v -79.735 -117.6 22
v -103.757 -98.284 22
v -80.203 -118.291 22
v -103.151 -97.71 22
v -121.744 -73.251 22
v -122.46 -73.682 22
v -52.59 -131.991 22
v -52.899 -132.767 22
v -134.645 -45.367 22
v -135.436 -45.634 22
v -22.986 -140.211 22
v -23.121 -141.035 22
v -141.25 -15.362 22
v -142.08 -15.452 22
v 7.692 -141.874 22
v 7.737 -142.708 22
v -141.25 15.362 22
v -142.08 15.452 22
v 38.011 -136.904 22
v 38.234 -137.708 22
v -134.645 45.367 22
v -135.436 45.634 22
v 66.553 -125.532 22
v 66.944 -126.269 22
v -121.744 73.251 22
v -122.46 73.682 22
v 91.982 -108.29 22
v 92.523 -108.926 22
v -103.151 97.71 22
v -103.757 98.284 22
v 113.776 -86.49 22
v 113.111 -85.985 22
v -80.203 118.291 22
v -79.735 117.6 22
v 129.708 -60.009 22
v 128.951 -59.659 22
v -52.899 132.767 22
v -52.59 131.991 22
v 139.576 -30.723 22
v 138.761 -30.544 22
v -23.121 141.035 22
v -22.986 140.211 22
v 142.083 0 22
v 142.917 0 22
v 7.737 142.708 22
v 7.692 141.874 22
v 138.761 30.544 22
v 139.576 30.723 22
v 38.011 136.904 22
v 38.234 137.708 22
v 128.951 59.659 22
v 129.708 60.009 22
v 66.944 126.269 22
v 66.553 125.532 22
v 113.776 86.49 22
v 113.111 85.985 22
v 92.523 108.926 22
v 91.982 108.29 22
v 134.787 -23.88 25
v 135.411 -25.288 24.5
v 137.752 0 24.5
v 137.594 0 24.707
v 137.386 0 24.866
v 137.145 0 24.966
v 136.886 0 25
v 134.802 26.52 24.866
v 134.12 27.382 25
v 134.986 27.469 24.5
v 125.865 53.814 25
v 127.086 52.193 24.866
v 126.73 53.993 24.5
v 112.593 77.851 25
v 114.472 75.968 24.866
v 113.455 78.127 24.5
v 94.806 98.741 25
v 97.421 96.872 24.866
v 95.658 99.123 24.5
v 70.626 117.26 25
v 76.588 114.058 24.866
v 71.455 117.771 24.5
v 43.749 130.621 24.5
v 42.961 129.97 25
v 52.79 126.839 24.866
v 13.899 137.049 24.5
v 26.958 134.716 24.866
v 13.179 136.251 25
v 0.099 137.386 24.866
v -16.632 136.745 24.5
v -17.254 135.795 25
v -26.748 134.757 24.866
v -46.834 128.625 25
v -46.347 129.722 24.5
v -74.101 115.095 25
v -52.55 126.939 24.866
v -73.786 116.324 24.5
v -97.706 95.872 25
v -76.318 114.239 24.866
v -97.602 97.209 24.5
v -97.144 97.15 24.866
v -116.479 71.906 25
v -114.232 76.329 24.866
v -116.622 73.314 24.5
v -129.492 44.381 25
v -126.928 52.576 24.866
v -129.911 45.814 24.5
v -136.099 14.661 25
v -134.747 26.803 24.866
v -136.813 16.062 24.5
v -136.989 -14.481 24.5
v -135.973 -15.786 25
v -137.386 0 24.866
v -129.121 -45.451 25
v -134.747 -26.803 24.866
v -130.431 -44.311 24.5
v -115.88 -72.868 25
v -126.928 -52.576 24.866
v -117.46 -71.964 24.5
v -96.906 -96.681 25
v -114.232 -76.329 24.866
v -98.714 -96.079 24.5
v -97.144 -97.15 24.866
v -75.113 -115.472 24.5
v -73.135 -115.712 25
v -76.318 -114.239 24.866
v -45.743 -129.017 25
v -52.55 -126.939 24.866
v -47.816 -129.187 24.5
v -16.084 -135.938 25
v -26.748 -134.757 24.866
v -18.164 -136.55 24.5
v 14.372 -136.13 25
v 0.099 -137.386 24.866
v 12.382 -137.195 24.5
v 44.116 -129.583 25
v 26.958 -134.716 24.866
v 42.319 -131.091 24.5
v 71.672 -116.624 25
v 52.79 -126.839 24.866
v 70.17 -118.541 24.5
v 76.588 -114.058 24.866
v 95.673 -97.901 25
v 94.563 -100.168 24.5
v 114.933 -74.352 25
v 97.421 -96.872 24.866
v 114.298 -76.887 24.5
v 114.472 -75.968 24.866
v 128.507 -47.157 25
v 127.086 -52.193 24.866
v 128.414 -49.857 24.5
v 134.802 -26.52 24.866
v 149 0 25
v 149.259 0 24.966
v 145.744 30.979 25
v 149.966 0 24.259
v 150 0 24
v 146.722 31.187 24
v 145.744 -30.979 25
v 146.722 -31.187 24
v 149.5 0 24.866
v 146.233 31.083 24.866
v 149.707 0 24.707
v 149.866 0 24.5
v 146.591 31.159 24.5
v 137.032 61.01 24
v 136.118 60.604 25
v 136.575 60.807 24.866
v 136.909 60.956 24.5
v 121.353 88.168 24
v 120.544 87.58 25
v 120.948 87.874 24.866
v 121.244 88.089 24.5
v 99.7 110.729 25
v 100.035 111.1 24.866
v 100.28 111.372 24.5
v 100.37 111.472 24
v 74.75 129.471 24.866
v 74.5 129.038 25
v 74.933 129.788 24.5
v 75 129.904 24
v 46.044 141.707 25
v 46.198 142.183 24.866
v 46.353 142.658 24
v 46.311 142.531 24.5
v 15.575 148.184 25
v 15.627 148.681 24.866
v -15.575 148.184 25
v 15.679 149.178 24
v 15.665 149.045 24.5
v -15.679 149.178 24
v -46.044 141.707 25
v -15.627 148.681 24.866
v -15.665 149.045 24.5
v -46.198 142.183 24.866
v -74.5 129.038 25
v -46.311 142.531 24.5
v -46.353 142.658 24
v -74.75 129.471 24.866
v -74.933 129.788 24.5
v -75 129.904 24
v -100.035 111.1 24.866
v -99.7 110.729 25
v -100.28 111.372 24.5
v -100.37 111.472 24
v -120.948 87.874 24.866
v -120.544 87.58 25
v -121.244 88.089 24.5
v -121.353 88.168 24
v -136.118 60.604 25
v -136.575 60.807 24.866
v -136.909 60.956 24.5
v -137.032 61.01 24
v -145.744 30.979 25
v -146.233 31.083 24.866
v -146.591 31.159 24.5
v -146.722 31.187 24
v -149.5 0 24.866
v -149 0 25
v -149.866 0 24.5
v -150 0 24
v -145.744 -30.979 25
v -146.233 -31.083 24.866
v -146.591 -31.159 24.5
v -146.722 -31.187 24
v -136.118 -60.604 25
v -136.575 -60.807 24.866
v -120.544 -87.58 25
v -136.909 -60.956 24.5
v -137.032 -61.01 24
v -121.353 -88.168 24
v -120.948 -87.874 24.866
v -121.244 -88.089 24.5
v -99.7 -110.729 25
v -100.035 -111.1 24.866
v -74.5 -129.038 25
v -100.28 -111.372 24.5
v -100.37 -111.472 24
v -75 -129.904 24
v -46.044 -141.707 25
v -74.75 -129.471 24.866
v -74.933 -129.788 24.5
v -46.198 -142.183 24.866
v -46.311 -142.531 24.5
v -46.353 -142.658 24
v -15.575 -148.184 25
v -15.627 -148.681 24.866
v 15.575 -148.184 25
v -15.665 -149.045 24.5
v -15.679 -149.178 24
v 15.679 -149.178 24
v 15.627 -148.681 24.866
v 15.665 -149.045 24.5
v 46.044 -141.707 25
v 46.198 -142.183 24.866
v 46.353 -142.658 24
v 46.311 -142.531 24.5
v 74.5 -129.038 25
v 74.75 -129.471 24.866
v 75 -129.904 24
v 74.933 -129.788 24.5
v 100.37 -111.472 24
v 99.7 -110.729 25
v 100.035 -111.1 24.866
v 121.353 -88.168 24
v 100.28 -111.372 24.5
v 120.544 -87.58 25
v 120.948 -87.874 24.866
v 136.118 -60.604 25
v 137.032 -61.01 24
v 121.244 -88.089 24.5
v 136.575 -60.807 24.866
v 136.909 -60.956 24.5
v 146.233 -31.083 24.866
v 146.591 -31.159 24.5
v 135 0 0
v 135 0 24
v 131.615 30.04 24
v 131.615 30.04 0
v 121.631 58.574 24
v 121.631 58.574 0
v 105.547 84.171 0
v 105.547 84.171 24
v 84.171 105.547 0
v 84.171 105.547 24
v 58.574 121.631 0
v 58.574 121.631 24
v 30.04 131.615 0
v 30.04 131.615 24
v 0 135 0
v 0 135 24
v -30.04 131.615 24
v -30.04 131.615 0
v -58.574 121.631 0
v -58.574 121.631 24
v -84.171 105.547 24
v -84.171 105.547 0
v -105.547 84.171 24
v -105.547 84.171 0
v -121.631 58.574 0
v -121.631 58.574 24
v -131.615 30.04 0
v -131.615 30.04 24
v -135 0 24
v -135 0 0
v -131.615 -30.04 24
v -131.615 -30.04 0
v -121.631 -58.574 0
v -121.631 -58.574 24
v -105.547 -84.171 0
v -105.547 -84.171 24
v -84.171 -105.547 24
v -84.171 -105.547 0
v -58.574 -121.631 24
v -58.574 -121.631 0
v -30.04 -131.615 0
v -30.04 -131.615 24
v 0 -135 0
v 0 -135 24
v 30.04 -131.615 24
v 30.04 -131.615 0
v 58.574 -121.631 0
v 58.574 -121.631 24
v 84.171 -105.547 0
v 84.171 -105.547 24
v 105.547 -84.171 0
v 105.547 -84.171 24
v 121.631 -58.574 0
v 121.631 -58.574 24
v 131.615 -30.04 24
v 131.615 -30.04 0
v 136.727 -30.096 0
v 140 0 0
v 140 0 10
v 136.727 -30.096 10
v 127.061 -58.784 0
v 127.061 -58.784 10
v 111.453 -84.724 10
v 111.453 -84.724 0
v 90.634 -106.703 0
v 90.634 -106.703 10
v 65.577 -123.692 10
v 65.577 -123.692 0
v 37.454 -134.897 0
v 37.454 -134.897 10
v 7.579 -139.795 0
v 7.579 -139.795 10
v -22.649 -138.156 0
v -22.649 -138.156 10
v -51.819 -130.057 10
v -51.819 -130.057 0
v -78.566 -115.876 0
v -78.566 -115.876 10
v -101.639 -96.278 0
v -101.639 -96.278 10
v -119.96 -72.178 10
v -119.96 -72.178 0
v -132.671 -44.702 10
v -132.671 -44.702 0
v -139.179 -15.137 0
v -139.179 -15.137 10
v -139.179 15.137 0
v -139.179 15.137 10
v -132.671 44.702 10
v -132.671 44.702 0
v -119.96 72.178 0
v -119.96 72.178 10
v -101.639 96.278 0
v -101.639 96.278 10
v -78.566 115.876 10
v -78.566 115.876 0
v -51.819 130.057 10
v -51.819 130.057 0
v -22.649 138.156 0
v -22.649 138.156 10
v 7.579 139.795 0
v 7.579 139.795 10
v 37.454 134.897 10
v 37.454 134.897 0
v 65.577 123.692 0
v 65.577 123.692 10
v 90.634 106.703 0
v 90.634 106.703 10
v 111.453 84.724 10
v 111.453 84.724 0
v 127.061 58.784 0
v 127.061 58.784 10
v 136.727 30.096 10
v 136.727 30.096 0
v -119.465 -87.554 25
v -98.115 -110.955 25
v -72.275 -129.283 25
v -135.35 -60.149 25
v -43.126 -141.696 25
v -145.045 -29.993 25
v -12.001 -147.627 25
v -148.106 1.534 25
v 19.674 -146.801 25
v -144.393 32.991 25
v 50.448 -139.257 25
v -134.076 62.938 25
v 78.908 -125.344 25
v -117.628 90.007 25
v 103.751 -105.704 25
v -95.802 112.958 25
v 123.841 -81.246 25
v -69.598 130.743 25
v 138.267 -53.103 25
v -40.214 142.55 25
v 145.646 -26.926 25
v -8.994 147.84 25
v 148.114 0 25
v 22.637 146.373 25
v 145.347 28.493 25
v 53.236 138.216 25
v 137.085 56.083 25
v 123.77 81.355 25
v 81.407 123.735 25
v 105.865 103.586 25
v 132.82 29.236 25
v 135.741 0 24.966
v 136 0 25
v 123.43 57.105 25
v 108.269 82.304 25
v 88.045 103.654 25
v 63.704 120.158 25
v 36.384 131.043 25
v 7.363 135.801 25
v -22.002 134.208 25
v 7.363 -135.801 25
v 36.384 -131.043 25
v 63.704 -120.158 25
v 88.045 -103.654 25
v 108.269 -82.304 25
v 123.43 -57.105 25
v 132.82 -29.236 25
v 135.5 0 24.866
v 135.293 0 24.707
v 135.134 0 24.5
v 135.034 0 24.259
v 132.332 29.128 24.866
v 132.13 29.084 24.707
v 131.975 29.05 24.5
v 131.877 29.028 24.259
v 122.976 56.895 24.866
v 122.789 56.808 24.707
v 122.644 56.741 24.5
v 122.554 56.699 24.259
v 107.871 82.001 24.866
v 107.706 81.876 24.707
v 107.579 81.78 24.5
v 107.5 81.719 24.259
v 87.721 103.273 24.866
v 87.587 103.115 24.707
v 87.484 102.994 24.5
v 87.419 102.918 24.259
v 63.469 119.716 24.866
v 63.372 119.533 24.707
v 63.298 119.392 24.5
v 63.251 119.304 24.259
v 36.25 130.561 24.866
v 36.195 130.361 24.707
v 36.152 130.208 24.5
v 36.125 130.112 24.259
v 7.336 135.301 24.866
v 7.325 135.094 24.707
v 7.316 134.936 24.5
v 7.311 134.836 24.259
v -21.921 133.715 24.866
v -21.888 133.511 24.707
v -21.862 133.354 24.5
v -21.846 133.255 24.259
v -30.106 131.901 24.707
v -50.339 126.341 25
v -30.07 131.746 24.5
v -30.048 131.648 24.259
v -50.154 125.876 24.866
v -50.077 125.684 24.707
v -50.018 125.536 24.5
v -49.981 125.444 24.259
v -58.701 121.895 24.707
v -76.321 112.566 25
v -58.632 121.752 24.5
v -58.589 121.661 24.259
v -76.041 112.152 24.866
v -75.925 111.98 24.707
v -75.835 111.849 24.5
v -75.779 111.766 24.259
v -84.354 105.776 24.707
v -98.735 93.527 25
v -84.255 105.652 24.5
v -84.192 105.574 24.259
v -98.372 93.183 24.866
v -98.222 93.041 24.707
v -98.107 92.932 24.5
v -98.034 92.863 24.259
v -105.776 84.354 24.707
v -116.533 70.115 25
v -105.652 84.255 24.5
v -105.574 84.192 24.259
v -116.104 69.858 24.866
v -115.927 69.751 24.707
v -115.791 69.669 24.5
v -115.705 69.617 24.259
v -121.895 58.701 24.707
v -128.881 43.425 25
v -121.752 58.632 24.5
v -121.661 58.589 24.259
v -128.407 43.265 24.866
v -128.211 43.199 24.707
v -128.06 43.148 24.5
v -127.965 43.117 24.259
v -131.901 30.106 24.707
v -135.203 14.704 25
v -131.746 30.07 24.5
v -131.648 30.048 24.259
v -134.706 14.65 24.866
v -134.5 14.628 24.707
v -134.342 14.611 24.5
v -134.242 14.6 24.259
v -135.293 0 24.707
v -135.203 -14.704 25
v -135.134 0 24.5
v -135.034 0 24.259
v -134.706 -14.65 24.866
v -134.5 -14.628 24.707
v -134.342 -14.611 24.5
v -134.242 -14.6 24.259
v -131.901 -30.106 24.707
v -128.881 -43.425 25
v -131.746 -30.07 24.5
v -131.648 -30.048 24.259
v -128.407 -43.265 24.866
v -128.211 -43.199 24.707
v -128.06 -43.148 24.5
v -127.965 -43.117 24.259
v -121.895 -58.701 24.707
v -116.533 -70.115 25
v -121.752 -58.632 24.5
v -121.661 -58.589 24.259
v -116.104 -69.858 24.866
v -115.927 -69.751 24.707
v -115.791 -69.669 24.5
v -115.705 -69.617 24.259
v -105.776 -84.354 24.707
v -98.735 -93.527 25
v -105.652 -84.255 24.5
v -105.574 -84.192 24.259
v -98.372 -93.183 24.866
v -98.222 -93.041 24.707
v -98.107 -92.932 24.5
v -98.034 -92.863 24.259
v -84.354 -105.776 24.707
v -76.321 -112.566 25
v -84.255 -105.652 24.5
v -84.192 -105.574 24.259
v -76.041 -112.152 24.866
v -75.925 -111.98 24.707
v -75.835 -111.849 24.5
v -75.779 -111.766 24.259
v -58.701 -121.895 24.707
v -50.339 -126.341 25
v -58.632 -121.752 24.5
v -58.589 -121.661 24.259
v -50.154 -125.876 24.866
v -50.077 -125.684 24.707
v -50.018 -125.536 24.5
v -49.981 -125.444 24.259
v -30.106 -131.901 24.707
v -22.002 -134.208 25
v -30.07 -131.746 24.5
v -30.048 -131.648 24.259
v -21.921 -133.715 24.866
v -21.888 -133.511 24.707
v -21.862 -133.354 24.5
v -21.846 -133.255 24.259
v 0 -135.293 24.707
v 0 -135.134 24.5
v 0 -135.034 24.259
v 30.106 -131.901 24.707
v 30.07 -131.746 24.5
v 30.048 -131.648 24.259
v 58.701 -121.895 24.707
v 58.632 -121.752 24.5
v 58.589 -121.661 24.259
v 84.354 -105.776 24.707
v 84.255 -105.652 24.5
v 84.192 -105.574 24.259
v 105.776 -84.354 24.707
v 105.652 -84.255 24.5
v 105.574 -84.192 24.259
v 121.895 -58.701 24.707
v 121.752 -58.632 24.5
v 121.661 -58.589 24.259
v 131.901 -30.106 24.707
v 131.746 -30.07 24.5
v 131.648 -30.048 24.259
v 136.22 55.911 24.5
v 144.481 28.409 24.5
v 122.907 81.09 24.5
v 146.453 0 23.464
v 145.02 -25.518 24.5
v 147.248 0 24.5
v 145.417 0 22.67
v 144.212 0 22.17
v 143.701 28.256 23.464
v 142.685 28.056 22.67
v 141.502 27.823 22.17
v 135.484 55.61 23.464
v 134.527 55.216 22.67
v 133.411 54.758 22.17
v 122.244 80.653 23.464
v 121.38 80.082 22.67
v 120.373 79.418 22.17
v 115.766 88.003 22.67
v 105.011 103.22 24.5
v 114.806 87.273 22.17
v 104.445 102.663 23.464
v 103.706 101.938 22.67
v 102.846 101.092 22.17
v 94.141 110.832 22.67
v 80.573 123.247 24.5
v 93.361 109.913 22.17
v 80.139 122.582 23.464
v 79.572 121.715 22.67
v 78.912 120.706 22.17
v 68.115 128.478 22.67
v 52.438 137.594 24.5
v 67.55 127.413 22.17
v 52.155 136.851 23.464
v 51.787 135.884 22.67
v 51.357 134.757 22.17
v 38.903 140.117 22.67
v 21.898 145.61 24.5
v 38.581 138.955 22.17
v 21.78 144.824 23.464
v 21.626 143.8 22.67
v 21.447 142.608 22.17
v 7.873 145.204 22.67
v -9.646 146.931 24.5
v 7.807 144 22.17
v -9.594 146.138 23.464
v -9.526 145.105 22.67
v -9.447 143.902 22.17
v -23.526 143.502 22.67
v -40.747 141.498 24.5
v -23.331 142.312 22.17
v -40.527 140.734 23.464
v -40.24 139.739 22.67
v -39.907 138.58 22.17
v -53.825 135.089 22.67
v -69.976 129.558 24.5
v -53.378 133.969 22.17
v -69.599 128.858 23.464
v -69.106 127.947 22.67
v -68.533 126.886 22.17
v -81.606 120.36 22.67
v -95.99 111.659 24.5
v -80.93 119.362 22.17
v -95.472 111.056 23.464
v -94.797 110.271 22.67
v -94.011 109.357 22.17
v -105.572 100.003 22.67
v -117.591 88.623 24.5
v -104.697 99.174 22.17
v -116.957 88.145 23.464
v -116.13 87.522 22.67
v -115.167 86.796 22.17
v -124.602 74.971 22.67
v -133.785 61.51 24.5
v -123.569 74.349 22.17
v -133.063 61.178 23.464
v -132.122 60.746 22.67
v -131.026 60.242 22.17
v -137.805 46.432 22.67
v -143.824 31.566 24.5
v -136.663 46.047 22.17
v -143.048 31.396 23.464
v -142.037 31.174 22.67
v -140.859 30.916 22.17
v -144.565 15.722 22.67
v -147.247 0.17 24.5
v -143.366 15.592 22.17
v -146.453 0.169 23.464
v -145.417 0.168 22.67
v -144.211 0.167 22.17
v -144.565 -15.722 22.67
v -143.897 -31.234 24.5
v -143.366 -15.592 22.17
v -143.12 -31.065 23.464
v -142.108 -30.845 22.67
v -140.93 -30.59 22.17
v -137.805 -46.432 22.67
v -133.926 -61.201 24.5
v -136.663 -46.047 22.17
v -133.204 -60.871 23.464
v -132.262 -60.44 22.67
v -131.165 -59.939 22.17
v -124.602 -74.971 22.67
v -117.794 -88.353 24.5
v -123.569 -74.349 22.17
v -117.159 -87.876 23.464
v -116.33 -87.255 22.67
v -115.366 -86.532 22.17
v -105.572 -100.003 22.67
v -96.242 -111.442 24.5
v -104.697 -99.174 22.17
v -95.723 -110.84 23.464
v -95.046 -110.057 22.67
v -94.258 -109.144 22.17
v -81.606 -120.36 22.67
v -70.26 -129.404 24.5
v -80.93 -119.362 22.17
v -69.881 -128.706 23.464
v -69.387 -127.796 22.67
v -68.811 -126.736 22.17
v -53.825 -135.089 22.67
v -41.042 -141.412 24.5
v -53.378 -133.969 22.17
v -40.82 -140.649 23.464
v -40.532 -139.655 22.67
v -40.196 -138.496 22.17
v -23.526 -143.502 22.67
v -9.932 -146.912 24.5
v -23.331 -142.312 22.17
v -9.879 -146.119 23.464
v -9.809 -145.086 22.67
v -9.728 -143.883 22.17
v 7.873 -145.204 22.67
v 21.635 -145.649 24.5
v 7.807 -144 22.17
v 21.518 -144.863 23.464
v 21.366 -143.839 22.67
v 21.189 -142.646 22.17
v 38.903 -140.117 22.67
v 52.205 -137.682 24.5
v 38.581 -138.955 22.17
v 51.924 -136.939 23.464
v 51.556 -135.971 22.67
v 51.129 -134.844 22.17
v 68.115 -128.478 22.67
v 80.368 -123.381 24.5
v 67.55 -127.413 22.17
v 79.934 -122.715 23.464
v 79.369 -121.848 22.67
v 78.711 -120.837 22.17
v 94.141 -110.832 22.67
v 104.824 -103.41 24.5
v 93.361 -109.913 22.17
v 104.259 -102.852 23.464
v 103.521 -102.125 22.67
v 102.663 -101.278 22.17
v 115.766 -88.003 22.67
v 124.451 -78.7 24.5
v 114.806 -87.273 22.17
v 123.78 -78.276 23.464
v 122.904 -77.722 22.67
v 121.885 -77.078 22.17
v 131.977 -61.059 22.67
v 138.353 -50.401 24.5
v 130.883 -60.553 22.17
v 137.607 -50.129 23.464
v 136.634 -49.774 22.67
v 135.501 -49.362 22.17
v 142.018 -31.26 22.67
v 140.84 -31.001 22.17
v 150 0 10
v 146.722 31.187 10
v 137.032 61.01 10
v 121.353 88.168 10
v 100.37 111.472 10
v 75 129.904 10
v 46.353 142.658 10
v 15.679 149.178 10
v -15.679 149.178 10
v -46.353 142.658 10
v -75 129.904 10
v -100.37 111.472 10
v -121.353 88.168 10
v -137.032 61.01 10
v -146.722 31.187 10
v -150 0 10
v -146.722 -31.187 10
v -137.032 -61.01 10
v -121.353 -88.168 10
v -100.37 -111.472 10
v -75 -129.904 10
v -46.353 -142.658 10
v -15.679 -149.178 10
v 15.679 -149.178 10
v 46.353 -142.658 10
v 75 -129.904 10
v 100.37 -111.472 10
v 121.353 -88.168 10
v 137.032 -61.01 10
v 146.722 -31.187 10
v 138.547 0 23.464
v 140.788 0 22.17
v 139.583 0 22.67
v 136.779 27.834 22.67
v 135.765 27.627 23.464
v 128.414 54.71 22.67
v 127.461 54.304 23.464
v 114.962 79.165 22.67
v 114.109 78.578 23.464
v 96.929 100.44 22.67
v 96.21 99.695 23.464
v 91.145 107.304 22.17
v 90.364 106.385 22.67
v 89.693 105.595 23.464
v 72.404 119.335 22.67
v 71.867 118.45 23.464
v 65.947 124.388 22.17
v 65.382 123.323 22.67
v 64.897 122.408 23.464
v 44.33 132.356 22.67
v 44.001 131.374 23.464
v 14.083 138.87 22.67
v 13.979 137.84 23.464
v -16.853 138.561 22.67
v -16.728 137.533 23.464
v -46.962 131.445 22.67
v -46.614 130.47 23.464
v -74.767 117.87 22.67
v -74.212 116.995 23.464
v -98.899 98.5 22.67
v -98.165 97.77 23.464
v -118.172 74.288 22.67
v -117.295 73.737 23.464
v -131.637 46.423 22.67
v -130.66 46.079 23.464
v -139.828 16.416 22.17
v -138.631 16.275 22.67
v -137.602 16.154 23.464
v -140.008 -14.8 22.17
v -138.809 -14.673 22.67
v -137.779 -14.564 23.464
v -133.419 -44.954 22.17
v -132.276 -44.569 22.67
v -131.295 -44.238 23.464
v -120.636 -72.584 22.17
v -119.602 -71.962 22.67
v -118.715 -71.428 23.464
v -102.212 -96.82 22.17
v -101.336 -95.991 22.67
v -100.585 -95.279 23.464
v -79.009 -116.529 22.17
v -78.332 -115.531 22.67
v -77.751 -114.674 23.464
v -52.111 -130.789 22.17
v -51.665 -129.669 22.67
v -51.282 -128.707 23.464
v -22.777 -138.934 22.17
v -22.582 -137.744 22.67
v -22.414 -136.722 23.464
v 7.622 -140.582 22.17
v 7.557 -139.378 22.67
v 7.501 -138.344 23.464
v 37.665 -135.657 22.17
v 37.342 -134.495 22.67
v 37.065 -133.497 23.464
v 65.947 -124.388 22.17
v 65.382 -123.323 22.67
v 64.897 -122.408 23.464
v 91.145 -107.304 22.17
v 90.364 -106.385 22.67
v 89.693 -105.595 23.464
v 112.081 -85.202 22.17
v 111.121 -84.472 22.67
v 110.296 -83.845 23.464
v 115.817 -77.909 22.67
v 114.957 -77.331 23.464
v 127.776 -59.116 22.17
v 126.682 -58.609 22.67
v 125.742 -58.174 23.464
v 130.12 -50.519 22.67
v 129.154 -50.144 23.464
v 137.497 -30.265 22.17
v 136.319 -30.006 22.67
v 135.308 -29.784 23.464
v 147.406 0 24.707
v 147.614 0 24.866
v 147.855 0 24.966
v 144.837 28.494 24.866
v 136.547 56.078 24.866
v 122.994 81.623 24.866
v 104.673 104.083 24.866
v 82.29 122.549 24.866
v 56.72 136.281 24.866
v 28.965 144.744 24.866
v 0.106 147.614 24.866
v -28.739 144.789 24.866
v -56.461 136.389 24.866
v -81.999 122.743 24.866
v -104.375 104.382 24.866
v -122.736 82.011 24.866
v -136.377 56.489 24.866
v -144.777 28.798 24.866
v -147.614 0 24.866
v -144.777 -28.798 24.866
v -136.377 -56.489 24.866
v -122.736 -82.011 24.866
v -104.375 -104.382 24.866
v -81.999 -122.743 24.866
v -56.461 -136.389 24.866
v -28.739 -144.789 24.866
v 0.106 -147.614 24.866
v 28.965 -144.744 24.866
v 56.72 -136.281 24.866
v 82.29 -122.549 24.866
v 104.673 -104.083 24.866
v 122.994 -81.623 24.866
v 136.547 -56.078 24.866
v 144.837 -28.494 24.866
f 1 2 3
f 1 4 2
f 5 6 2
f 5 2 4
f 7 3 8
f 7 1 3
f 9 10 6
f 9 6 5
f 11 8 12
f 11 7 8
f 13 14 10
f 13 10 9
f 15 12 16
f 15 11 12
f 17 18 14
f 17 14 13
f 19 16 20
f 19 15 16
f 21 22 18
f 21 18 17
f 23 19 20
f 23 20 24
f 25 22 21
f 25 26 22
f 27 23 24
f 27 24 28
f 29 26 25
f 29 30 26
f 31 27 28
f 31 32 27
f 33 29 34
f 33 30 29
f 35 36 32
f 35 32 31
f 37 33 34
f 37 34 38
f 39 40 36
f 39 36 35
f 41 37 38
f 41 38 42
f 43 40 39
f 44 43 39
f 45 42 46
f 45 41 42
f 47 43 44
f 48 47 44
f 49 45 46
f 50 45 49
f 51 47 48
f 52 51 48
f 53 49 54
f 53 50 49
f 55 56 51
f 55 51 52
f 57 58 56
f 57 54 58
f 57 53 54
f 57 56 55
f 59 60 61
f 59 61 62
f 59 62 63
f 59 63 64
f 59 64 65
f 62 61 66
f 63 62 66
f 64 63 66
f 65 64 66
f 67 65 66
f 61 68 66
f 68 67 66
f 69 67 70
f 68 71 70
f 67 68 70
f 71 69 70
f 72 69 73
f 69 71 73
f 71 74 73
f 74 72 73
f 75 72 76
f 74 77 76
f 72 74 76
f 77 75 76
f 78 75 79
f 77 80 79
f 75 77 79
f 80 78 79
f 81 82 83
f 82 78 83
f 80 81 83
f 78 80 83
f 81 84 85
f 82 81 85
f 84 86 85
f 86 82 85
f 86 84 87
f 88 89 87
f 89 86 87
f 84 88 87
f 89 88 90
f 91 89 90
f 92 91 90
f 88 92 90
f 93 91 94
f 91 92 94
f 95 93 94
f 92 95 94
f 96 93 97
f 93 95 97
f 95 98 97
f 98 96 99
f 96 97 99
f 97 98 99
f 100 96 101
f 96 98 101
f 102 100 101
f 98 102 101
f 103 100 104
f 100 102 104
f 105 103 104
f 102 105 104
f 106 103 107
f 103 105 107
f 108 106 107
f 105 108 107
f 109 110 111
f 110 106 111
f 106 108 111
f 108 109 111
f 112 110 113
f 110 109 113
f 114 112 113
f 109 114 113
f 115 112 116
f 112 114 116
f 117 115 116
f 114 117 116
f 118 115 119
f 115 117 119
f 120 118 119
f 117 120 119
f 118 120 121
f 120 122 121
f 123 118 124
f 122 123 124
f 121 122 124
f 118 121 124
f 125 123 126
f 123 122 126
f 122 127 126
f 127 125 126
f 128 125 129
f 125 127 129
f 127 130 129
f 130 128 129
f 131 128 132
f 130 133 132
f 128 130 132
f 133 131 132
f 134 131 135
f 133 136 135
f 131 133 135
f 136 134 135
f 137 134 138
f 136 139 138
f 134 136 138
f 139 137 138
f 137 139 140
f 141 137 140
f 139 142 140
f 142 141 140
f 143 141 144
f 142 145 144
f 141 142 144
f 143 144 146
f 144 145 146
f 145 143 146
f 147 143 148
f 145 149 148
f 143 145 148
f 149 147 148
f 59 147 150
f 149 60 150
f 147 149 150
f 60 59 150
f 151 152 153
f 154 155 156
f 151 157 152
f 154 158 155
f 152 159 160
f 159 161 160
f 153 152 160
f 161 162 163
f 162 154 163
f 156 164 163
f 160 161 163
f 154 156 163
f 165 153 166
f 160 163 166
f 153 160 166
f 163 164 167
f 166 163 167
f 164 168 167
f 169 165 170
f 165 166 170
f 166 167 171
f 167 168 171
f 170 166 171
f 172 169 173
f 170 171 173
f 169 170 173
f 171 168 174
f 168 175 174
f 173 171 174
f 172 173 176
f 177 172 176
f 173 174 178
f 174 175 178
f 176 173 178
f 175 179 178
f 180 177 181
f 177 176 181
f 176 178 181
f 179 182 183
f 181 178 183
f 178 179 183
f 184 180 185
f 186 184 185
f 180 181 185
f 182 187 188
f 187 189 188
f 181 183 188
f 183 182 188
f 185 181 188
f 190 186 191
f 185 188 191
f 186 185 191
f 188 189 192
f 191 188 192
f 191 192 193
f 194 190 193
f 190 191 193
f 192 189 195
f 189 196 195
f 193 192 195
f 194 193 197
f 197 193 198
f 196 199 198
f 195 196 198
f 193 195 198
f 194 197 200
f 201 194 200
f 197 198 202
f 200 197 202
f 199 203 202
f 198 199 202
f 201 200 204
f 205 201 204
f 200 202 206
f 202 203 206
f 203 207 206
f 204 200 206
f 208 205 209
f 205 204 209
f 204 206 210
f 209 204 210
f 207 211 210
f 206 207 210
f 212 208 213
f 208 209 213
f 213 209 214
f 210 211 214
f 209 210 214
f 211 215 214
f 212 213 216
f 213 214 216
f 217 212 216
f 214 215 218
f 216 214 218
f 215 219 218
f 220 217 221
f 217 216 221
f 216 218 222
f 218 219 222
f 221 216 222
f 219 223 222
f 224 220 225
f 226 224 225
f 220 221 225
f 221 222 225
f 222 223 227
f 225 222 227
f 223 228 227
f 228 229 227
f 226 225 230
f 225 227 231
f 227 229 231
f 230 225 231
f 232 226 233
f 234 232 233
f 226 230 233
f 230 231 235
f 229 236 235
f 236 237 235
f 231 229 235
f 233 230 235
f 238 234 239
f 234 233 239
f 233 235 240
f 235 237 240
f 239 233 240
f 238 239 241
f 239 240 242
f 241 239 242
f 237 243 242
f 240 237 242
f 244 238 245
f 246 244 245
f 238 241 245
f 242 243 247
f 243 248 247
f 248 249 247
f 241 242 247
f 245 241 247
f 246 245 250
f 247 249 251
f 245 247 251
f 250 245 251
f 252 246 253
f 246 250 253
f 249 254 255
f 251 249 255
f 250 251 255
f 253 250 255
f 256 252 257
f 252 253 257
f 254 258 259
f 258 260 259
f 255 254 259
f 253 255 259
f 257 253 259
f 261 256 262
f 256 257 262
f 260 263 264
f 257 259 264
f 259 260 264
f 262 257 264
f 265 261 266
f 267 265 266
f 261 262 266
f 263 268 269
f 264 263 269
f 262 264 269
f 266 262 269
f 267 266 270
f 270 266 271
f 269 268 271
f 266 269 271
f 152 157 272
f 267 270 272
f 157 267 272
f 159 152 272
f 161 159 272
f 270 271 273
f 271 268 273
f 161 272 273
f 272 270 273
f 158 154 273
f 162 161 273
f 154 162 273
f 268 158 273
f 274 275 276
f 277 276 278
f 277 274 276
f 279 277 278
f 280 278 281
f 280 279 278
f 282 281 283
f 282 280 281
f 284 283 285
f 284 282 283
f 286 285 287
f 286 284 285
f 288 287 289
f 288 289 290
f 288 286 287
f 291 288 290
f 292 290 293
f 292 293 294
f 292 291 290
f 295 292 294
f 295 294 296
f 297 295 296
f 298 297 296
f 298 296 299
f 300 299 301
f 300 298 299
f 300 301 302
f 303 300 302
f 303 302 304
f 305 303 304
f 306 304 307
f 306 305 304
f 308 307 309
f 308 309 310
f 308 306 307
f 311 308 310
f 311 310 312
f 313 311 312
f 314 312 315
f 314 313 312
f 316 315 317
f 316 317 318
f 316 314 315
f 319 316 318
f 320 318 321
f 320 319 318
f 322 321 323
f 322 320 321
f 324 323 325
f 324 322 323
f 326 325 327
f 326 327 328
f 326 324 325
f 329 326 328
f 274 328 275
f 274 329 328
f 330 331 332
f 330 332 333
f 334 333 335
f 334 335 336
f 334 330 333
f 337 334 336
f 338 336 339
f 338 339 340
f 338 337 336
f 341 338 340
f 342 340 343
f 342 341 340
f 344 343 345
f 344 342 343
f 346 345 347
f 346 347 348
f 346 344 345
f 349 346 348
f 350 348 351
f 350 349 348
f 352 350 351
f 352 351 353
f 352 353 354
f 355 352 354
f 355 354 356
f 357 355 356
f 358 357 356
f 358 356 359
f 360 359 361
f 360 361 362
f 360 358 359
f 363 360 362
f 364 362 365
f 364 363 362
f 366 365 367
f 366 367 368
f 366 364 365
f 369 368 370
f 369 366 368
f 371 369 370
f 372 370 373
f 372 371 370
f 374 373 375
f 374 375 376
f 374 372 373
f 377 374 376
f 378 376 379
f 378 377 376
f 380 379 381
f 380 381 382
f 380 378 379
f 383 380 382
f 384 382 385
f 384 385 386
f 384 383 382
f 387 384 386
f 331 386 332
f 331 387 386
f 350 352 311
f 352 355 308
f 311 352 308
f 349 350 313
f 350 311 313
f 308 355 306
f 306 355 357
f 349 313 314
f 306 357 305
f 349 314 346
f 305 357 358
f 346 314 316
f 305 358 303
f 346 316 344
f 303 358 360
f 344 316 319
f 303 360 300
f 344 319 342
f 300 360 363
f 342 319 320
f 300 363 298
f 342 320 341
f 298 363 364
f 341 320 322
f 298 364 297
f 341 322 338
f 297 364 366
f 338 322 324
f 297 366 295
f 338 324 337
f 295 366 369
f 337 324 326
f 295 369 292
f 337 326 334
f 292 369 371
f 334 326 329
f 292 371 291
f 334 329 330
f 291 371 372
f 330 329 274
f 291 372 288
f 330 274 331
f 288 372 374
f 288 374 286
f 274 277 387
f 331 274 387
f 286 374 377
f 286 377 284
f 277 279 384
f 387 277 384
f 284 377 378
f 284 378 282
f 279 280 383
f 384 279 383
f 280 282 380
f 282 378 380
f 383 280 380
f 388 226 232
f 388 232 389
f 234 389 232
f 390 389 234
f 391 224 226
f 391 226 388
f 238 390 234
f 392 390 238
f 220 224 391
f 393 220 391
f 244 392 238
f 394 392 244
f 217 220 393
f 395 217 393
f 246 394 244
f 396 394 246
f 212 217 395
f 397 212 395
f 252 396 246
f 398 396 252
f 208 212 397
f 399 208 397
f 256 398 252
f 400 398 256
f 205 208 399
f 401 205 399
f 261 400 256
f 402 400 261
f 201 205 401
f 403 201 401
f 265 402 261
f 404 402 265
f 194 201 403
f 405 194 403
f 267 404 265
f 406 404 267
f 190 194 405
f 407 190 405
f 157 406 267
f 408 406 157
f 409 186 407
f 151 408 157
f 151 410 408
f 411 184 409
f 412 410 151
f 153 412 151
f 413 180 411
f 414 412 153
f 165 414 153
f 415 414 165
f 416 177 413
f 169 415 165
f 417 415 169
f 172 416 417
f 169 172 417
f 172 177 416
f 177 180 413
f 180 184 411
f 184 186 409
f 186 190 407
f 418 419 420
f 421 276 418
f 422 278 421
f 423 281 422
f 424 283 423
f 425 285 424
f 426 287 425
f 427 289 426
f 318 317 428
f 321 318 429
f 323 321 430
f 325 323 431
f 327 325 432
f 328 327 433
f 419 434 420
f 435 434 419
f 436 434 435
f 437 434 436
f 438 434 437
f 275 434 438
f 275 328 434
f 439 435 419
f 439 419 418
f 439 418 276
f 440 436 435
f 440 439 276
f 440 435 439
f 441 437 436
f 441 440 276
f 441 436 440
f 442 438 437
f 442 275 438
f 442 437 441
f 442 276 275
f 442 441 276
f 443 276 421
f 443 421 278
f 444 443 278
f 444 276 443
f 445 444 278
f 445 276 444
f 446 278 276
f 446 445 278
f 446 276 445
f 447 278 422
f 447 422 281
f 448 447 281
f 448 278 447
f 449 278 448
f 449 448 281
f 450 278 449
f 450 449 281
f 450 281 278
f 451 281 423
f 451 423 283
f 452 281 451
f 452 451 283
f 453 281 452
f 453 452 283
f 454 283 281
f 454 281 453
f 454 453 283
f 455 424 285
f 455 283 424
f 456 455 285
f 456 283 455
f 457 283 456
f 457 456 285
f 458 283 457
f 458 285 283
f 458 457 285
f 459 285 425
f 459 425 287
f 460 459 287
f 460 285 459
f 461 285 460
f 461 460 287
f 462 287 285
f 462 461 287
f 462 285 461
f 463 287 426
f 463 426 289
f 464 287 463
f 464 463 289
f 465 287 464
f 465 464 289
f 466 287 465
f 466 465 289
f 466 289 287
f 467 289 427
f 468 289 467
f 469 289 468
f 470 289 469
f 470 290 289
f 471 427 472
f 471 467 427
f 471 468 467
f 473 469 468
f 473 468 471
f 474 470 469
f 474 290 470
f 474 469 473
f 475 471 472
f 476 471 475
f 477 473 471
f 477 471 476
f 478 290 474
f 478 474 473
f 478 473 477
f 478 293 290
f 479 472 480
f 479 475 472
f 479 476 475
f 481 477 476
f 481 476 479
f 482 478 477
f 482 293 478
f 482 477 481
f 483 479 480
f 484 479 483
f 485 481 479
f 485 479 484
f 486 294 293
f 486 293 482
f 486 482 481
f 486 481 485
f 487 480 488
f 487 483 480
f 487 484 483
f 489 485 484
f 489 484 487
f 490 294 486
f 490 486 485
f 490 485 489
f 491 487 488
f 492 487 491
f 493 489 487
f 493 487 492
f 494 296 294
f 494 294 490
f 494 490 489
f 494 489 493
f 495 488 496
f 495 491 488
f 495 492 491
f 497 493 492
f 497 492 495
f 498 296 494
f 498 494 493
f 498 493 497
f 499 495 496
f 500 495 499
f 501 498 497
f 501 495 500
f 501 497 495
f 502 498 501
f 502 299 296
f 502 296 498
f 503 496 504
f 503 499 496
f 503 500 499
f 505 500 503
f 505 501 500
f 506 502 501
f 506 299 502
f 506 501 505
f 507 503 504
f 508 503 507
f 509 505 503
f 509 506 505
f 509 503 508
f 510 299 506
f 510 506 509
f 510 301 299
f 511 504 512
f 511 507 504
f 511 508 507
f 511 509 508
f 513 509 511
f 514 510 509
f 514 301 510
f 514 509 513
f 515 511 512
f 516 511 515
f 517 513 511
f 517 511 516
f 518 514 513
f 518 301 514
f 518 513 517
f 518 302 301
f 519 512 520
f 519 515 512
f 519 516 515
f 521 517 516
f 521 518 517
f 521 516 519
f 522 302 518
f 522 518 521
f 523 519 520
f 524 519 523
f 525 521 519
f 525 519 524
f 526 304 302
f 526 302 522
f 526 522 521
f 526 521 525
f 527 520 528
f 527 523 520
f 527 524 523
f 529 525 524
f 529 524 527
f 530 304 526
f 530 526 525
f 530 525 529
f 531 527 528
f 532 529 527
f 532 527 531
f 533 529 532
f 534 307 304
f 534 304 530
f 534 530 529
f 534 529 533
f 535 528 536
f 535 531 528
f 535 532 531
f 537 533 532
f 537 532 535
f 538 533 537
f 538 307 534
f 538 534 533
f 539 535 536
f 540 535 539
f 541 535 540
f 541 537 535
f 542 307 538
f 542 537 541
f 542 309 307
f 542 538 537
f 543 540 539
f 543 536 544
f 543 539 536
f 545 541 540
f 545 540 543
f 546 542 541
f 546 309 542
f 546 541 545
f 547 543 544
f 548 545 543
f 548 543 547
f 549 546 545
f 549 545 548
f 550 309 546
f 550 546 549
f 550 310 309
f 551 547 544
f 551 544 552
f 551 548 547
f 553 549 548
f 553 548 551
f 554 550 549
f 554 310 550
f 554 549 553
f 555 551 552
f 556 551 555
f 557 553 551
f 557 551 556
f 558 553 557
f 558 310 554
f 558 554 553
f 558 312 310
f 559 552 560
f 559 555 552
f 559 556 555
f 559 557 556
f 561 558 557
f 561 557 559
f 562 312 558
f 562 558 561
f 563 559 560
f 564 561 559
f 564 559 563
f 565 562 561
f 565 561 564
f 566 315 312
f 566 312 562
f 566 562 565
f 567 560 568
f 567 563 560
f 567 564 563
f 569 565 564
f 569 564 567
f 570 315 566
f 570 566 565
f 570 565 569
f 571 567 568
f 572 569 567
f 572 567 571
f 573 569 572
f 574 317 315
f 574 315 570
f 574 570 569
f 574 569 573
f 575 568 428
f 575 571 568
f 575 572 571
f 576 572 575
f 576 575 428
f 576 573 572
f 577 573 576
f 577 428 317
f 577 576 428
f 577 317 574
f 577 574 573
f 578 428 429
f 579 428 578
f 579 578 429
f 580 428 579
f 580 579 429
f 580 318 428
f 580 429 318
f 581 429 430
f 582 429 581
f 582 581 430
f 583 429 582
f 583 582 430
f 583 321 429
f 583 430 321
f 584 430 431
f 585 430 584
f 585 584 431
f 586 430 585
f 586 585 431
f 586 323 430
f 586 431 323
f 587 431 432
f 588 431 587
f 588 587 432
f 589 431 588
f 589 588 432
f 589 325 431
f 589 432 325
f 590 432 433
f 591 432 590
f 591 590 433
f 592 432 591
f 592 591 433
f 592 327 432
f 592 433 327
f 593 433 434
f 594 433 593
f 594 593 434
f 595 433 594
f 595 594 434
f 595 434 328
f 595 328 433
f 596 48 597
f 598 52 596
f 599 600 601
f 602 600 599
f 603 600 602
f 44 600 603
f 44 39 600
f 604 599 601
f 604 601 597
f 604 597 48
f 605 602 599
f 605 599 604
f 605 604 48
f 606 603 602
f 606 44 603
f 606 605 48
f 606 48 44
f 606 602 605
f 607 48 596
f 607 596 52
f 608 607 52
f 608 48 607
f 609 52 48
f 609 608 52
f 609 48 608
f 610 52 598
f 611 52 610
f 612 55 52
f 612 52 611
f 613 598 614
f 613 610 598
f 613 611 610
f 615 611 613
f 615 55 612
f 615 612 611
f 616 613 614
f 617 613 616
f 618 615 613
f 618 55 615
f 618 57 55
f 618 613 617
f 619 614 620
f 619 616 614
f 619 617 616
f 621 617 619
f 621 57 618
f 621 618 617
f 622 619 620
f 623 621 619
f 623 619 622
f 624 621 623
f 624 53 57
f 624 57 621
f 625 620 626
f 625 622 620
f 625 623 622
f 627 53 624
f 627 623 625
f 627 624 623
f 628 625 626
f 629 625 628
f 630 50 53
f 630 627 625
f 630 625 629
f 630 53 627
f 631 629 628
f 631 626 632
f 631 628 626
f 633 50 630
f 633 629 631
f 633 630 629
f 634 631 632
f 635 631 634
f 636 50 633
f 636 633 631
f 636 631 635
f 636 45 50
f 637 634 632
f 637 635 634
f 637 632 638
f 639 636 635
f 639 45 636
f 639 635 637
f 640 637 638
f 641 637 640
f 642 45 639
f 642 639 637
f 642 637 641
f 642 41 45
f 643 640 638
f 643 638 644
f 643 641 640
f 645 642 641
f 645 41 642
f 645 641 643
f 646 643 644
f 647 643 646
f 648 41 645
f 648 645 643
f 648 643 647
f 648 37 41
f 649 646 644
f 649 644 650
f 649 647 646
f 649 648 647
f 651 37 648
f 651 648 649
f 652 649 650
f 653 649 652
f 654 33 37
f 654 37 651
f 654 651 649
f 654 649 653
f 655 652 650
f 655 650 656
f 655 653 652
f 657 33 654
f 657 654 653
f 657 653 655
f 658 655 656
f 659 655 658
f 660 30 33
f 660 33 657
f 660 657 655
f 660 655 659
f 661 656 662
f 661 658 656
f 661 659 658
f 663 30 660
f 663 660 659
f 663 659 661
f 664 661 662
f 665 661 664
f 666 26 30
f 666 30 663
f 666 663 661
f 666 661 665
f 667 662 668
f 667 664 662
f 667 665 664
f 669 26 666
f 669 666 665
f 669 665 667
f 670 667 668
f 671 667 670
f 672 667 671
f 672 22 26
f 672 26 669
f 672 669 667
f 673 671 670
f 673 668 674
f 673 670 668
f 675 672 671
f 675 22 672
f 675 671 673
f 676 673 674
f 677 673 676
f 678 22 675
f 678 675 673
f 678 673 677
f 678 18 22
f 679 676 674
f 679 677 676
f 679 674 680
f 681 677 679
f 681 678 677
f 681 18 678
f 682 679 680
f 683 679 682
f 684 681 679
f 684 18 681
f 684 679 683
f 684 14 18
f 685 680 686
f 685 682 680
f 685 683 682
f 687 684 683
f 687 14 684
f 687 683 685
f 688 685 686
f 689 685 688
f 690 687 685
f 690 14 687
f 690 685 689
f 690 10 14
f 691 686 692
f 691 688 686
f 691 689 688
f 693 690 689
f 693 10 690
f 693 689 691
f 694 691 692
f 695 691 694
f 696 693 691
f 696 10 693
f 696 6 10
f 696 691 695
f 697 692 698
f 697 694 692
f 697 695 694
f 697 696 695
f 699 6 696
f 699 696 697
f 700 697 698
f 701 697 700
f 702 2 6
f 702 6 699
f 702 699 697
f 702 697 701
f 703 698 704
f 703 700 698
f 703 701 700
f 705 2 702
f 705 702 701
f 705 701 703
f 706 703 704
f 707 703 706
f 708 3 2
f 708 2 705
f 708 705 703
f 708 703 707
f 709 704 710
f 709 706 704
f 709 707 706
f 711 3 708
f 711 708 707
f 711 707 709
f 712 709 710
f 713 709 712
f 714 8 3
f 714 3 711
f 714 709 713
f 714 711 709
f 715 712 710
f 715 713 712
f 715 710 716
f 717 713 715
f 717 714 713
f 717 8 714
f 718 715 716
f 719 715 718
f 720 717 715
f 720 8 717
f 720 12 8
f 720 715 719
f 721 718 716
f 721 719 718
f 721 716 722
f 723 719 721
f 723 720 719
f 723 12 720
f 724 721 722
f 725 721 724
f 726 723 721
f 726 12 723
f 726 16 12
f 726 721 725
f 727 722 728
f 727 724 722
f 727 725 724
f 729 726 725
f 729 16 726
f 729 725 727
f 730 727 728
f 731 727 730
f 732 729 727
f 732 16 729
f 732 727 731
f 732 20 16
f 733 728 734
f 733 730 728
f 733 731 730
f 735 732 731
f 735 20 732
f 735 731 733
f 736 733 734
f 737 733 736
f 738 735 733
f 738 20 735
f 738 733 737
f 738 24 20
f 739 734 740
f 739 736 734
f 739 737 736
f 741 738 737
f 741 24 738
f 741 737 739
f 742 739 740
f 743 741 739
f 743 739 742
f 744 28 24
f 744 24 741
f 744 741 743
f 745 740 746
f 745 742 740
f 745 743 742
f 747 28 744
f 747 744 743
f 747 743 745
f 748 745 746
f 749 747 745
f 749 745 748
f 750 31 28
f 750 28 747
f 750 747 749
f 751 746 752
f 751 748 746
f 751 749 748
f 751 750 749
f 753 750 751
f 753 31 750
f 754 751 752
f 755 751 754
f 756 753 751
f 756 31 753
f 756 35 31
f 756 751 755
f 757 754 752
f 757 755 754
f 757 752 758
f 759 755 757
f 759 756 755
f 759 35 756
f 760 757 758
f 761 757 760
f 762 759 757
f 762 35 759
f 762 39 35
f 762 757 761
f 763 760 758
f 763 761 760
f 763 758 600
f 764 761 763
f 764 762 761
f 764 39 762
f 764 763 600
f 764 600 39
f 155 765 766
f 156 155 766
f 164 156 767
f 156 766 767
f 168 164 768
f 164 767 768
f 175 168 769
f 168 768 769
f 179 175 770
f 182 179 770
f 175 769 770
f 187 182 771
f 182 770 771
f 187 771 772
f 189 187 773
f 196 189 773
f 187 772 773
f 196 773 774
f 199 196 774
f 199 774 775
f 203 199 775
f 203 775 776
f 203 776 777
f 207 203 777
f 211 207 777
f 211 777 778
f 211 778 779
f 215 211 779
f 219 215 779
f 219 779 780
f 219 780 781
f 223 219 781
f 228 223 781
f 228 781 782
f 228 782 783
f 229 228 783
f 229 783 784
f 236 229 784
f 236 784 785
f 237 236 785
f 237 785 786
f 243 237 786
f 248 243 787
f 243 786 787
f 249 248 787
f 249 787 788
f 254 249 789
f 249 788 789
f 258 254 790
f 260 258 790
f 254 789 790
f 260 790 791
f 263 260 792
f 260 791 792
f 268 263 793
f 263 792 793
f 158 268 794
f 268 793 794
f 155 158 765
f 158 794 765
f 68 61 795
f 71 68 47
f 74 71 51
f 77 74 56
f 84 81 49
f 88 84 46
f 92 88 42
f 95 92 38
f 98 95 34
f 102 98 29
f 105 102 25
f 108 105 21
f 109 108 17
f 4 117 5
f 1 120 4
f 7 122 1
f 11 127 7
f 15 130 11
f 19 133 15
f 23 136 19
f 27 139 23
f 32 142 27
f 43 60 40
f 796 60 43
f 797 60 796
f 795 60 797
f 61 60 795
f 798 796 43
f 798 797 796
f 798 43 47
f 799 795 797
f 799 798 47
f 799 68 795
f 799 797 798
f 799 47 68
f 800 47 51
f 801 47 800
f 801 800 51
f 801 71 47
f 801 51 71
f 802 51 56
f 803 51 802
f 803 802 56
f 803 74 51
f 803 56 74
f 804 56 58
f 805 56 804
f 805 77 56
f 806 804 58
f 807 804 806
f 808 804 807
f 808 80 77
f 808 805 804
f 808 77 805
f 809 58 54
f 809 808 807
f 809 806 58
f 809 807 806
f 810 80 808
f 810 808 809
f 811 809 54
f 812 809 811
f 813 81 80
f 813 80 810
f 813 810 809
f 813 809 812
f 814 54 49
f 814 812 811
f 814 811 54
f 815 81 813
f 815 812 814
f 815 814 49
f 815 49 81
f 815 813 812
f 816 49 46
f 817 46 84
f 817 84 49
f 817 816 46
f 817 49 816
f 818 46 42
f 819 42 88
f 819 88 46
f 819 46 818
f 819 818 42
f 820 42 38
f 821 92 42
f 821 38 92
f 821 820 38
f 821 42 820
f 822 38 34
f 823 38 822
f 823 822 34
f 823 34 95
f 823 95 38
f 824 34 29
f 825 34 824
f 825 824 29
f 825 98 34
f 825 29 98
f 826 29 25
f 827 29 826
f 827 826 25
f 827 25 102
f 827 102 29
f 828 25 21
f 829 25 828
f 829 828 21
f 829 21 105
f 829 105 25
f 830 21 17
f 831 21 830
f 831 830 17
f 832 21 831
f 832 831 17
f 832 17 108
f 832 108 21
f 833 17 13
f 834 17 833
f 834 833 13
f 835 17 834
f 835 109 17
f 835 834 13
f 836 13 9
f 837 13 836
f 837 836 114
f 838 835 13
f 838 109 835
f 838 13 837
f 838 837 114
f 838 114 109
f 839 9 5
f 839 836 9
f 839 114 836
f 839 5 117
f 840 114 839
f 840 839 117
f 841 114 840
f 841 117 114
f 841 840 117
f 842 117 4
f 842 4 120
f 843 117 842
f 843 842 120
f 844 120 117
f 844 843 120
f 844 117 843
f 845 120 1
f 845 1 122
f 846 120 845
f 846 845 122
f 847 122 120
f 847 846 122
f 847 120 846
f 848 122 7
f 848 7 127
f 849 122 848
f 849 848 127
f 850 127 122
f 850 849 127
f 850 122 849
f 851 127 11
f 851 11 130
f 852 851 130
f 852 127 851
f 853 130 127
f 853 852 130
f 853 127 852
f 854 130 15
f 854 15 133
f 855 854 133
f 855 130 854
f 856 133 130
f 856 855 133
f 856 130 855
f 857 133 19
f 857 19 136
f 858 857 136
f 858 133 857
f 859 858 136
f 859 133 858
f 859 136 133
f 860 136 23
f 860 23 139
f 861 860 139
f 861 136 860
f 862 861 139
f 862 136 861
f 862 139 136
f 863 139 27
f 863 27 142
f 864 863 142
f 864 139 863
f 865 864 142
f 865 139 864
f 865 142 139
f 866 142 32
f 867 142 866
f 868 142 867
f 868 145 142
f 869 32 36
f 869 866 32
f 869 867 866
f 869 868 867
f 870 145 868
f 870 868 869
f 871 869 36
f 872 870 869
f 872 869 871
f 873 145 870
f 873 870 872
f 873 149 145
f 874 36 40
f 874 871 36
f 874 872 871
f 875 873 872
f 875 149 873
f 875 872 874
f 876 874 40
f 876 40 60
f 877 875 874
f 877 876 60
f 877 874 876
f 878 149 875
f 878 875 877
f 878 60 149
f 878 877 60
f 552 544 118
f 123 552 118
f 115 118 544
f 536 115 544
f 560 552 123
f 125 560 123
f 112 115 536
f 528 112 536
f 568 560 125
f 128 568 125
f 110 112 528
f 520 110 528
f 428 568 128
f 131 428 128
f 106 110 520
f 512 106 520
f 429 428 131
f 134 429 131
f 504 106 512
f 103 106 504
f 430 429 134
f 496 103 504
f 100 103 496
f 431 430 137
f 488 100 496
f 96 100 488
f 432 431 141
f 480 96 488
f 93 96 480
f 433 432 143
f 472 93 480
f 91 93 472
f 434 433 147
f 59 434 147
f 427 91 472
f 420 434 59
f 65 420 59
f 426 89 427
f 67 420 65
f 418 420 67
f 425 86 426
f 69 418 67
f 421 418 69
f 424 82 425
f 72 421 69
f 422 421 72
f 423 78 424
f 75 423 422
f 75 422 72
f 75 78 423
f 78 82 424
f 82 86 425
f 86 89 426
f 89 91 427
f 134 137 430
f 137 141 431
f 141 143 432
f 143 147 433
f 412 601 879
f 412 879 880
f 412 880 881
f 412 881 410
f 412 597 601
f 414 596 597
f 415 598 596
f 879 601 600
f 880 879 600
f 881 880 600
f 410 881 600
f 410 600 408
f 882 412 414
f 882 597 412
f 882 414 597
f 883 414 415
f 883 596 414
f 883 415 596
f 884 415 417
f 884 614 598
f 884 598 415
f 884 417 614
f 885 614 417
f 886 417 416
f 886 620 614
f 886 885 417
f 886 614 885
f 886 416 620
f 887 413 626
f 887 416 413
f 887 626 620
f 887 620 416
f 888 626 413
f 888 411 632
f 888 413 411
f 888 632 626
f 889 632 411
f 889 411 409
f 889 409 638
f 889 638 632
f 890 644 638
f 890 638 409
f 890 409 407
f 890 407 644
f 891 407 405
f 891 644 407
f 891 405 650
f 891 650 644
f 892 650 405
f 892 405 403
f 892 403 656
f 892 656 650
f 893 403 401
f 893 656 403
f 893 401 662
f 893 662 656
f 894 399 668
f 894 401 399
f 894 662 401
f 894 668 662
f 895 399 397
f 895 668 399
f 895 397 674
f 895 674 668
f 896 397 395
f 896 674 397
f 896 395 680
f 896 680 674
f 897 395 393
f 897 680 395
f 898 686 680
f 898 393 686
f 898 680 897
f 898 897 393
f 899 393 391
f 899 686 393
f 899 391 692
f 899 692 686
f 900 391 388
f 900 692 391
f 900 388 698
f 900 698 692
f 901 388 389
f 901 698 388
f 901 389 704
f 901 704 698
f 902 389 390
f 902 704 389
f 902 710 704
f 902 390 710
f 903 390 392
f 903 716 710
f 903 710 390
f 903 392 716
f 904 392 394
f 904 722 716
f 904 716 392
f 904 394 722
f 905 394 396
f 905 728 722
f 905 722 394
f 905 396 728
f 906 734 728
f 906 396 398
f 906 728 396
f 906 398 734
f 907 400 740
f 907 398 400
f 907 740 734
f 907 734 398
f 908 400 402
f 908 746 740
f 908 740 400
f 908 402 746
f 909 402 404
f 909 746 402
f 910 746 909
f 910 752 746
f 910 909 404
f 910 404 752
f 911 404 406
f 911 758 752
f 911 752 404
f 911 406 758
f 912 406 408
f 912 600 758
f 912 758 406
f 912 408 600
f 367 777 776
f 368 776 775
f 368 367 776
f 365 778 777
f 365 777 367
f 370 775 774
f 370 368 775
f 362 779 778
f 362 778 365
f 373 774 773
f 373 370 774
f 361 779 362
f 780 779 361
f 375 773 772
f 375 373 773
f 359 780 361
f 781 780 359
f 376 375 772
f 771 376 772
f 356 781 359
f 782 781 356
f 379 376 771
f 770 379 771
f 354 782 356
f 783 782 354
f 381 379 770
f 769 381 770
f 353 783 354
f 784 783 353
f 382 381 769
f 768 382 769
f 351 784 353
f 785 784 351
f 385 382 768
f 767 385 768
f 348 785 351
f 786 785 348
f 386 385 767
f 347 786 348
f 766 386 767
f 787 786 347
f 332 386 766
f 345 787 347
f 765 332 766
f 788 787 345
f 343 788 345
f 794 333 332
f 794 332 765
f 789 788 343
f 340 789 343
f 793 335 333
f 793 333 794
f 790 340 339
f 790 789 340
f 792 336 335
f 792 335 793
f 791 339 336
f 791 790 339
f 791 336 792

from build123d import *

# Parameters (mm, degrees)
F0_R     = 150
F0_R_2   = 135
F1_DEPTH = 25
F2_R     = 150
F2_R_2   = 140
F3_DEPTH = 10
F4_R     = 147.5
F4_R_2   = 137.5
F5_DEPTH = 3
F7_R     = 1
F8_R     = 1


# Not quite as in the source:
# - a fillet or chamfer that OpenCascade refuses, or shapes differently, is made with other operations: its cross-section is extruded or revolved along the edge and cut away or added


with BuildPart() as f1:
    # F0 (on Top) → F1 (new body)
    with BuildSketch(Plane.XY):
        Circle(F0_R)
        Circle(F0_R_2, mode=Mode.SUBTRACT)
    extrude(amount=F1_DEPTH)

    # F2 (on face) → F3 (cut)
    with BuildSketch(Plane(origin=(0, 0, 0), x_dir=(1, 0, 0), z_dir=(0, 0, -1))):
        Circle(F2_R)
        Circle(F2_R_2, mode=Mode.SUBTRACT)
    extrude(amount=-F3_DEPTH, mode=Mode.SUBTRACT)

    # F4 (on face) → F5 (cut)
    with BuildSketch(Plane.XY.offset(25)):
        Circle(F4_R)
        Circle(F4_R_2, mode=Mode.SUBTRACT)
    extrude(amount=-F5_DEPTH, mode=Mode.SUBTRACT)

    # F6: fillet of radius 5 on 2 edges, made by hand

    # F6_s1 → F6_t2 (revolve)
    with BuildSketch(Plane.XZ):
        with BuildLine():
            ThreePointArc((142.082575695, 22), (139.3439629074, 22.8166998673), (137.5, 25))
            Line((137.5, 25), (137.5, 22))
            Line((137.5, 22), (142.082575695, 22))
        make_face()
    revolve(axis=Axis((0, 0, 22), (0, 0, 1)))

    # F6_s3 → F6_t4 (revolve)
    with BuildSketch(Plane.XZ):
        with BuildLine():
            ThreePointArc((147.5, 25), (145.6560370926, 22.8166998673), (142.917424305, 22))
            Line((142.917424305, 22), (147.5, 22))
            Line((147.5, 22), (147.5, 25))
        make_face()
    revolve(axis=Axis((0, 0, 22), (0, 0, 1)))

    # F7
    f7_edges = [f1.edges().sort_by_distance(p)[0] for p in [
        (-147.5, 0, 25),
        (-150, 0, 25),
    ]]
    fillet(f7_edges, radius=F7_R)

    # F8
    f8_edges = [f1.edges().sort_by_distance(p)[0] for p in [
        (-137.5, 0, 25),
        (-135, 0, 25),
    ]]
    fillet(f8_edges, radius=F8_R)


solid = f1.part
